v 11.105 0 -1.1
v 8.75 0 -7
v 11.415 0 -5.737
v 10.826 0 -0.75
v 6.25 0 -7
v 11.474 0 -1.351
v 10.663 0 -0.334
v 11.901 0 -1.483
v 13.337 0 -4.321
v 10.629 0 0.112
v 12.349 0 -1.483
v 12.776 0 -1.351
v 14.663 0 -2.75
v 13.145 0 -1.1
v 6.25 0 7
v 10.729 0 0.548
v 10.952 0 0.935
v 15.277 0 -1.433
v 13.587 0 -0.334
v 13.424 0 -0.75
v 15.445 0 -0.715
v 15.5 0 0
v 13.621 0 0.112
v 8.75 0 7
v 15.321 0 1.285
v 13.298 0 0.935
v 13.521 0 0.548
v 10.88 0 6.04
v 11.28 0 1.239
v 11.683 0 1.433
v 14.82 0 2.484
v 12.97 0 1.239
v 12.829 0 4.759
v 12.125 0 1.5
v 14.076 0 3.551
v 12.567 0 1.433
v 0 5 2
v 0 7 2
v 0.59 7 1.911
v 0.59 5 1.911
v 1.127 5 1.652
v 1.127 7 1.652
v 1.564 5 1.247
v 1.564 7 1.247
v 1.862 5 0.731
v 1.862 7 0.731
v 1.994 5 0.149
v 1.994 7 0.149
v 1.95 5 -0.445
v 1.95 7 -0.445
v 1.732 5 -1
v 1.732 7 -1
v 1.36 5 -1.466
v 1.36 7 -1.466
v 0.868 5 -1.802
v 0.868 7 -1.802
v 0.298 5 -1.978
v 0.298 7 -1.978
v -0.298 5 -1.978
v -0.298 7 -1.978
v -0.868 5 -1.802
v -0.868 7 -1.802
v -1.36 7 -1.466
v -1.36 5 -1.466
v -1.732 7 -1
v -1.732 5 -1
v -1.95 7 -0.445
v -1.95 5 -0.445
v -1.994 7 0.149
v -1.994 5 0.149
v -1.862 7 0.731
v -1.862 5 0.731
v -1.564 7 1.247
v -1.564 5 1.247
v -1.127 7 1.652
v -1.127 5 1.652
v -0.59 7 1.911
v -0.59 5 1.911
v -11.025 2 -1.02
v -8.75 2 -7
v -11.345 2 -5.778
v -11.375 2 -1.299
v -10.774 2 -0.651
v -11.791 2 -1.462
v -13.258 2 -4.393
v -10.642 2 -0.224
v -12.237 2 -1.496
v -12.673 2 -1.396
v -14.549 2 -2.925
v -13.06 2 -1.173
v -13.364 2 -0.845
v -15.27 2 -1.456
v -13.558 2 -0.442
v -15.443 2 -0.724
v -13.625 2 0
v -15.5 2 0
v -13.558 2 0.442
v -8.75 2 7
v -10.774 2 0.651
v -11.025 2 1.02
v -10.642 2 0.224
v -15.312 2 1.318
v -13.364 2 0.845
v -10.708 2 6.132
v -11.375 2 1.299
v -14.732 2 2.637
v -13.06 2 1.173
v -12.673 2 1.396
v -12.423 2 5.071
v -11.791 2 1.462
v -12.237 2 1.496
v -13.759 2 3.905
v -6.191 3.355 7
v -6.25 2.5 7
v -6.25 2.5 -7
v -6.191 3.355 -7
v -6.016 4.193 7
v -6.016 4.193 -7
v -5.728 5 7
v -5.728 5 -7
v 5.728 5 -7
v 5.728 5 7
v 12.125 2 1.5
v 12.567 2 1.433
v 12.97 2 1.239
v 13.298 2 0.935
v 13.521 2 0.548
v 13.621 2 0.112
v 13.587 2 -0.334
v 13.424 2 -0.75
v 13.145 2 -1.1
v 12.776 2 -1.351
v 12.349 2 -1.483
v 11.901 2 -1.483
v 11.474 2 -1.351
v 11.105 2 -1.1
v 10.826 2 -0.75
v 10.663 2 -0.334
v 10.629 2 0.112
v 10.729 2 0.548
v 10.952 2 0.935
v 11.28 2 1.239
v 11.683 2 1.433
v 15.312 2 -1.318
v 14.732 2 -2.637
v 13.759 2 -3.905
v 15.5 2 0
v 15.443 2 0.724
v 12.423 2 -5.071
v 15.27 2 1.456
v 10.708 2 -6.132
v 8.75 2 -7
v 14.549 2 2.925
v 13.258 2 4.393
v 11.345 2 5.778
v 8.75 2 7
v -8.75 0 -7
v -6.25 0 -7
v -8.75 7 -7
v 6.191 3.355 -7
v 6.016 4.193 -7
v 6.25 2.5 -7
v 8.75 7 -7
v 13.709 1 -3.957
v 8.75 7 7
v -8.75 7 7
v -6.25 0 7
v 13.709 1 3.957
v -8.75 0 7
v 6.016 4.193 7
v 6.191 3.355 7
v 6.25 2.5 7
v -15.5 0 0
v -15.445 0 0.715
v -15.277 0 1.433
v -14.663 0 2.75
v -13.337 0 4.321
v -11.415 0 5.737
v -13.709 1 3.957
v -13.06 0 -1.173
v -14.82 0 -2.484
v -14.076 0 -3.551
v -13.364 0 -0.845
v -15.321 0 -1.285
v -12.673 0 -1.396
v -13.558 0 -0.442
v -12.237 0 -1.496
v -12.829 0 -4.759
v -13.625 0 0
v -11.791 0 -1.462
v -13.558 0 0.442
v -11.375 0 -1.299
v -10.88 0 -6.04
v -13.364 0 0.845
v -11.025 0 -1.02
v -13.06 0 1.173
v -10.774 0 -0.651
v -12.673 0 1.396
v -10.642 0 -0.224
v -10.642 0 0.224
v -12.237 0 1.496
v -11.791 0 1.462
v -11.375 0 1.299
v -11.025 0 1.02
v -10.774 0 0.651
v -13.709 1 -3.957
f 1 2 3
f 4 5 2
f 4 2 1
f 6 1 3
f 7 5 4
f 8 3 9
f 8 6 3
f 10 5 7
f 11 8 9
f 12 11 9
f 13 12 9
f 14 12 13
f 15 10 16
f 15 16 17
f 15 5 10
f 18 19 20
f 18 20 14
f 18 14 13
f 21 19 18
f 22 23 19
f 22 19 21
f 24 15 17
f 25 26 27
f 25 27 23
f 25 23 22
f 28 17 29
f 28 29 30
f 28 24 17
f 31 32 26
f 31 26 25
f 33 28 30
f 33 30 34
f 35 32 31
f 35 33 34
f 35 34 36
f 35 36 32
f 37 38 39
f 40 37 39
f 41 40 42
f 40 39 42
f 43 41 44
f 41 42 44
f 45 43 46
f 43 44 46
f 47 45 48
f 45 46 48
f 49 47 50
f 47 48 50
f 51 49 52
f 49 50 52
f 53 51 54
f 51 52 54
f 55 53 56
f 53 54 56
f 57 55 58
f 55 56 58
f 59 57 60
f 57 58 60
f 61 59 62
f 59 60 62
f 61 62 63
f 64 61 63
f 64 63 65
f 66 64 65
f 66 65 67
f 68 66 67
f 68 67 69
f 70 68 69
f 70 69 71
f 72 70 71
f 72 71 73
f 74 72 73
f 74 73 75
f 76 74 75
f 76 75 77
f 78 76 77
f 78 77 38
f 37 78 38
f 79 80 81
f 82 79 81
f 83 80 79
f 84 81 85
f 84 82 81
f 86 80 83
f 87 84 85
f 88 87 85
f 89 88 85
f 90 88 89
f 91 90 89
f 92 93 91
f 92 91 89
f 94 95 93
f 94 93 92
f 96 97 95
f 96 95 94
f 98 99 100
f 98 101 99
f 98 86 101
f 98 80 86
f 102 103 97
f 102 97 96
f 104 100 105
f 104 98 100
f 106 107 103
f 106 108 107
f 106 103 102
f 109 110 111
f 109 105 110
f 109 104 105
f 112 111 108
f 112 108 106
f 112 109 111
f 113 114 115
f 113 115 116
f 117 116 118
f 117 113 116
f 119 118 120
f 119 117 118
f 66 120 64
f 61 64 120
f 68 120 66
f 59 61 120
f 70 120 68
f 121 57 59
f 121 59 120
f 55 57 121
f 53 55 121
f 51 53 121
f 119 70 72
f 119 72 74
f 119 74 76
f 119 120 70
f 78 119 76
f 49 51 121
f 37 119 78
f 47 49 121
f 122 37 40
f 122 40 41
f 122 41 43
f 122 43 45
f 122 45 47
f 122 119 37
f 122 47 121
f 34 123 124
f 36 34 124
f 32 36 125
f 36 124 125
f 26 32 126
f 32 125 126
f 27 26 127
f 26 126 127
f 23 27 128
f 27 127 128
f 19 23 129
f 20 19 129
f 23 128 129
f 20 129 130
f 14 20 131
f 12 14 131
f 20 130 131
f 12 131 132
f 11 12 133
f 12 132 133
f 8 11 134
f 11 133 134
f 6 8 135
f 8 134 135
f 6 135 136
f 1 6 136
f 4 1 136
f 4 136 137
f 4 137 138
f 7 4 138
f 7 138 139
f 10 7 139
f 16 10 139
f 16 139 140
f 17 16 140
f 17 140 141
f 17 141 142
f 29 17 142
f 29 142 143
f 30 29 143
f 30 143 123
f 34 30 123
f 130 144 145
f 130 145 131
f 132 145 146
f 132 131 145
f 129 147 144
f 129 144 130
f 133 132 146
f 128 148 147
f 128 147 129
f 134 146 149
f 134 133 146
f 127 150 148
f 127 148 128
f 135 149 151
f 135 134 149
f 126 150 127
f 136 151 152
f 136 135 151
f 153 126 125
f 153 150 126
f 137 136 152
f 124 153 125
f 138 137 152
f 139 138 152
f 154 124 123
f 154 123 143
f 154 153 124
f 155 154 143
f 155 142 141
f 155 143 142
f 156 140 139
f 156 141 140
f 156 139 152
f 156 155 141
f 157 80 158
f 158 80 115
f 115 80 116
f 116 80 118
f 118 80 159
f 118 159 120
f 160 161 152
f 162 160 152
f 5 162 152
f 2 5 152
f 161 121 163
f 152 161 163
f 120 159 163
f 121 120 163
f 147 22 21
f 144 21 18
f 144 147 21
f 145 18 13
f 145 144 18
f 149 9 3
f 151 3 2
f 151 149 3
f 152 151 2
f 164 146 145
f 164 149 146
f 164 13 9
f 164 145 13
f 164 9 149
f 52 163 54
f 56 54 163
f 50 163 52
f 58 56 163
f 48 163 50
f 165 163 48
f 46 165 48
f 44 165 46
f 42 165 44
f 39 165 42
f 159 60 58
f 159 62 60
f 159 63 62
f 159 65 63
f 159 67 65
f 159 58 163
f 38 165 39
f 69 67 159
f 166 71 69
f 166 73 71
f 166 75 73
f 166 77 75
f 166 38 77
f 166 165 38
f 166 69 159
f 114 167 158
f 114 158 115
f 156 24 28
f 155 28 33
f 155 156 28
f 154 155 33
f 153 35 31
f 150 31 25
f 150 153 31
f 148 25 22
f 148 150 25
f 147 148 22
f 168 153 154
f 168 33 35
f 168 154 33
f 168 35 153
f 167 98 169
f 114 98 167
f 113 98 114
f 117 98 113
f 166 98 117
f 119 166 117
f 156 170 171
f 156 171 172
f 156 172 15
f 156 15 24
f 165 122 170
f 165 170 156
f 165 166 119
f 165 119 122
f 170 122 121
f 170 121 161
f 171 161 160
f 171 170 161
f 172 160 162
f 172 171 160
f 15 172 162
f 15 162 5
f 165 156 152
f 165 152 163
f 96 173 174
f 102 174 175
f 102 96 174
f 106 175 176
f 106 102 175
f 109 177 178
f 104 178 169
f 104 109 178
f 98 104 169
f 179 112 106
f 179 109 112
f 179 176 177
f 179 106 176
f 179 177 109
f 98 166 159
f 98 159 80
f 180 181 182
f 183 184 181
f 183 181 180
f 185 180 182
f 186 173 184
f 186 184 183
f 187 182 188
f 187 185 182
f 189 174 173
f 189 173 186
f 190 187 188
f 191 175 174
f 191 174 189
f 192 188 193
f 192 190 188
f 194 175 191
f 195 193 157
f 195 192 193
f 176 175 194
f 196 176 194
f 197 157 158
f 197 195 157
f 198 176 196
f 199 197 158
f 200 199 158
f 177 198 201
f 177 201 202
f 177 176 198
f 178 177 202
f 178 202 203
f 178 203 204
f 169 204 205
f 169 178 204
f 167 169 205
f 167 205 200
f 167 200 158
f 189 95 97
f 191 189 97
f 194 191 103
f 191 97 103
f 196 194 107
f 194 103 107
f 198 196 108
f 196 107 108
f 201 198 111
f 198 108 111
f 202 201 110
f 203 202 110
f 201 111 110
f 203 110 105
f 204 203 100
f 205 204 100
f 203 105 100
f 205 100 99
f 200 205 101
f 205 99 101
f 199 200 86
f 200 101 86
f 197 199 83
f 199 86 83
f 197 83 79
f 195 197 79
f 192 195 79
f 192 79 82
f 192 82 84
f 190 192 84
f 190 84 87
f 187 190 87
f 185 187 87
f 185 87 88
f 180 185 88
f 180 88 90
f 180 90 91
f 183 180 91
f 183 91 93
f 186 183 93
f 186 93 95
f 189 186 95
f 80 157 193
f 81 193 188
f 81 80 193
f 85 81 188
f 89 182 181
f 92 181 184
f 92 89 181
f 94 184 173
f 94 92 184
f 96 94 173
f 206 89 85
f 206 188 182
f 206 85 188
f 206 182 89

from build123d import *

# Parameters (mm, degrees)
BOSS_EXTRU_1_DEPTH      = 7
ESQUISSE3_R             = 1.5
ENL_V_MAT_EXTRU_2_DEPTH = 8.5
ESQUISSE4_R             = 2
ENL_V_MAT_EXTRU_3_DEPTH = 19.391574158
ENL_V_MAT_EXTRU_4_DEPTH = 18.727097901


with BuildPart() as part:
    # Esquisse1 → Boss.-Extru.1 (new, symmetric)
    with BuildSketch(Plane.XY):
        with BuildLine():
            Line((-15.5, 0), (-6.25, 0))
            Line((-6.25, 0), (-6.25, 2.5))
            ThreePointArc((-6.25, 2.5), (-6.118164456, 3.776935273), (-5.728219619, 5))
            Line((-5.728219619, 5), (5.728219619, 5))
            ThreePointArc((5.728219619, 5), (6.118164456, 3.776935273), (6.25, 2.5))
            Line((6.25, 2.5), (6.25, 0))
            Line((6.25, 0), (15.5, 0))
            Line((15.5, 0), (15.5, 2))
            Line((15.5, 2), (8.75, 2))
            Line((8.75, 2), (8.75, 7))
            Line((8.75, 7), (-8.75, 7))
            Line((-8.75, 7), (-8.75, 2))
            Line((-8.75, 2), (-15.5, 2))
            Line((-15.5, 2), (-15.5, 0))
        make_face()
    extrude(amount=BOSS_EXTRU_1_DEPTH, both=True)

    # Esquisse3 → Enlèv. mat.-Extru.2 (cut)
    with BuildSketch(Plane(origin=(0, 2, 0), x_dir=(1, 0, 0), z_dir=(0, 1, 0))):
        with Locations(Location((-12.125, 0, 0), (0, 0, 180))):
            Circle(ESQUISSE3_R)
        with Locations(Location((12.125, 0, 0), (0, 0, 270))):
            Circle(ESQUISSE3_R)
    extrude(amount=-ENL_V_MAT_EXTRU_2_DEPTH, mode=Mode.SUBTRACT)

    # Esquisse4 → Enlèv. mat.-Extru.3 (cut, through all)
    with BuildSketch(Plane(origin=(0, 7, 0), x_dir=(1, 0, 0), z_dir=(0, 1, 0))):
        with Locations(Location((0, 0, 0), (0, 0, 270))):
            Circle(ESQUISSE4_R)
    extrude(amount=-ENL_V_MAT_EXTRU_3_DEPTH, mode=Mode.SUBTRACT)

    # Esquisse5 → Enlèv. mat.-Extru.4 (cut, through all)
    with BuildSketch(Plane(origin=(0, 2, 0), x_dir=(1, 0, 0), z_dir=(0, 1, 0))):
        with BuildLine():
            add(Edge.make_bspline(
                [(-8.75, 7), (-15.499999991, 4.474226807), (-15.5, 9e-09)],
                knots=[2.170643252, 2.170643252, 2.170643252, 3.141592653, 3.141592653, 3.141592653], degree=2, weights=[1, 0.88445354, 1]))
            Line((-8.75, 7), (-15.5, 7))
            Line((-15.5, 7), (-15.5, 9e-09))
        make_face()
        with BuildLine():
            Line((15.5, 7), (8.75, 7))
            add(Edge.make_bspline(
                [(15.5, 0), (15.5, 4.474226804), (8.75, 7)],
                knots=[0, 0, 0, 0.970949401, 0.970949401, 0.970949401], degree=2, weights=[1, 0.88445354, 1]))
            Line((15.5, 0), (15.5, 7))
        make_face()
        with BuildLine():
            add(Edge.make_bspline(
                [(-15.5, 9e-09), (-15.500000009, -4.474226801), (-8.75, -7)],
                knots=[3.141592653, 3.141592653, 3.141592653, 4.112542055, 4.112542055, 4.112542055], degree=2, weights=[1, 0.88445354, 1]))
            Line((-15.5, 9e-09), (-15.5, -7))
            Line((-15.5, -7), (-8.75, -7))
        make_face()
        with BuildLine():
            Line((15.5, -7), (15.5, 0))
            add(Edge.make_bspline(
                [(8.75, -7), (15.5, -4.474226804), (15.5, 0)],
                knots=[5.312235906, 5.312235906, 5.312235906, 6.283185307, 6.283185307, 6.283185307], degree=2, weights=[1, 0.88445354, 1]))
            Line((8.75, -7), (15.5, -7))
        make_face()
    extrude(amount=-ENL_V_MAT_EXTRU_4_DEPTH, mode=Mode.SUBTRACT)


solid = part.part
